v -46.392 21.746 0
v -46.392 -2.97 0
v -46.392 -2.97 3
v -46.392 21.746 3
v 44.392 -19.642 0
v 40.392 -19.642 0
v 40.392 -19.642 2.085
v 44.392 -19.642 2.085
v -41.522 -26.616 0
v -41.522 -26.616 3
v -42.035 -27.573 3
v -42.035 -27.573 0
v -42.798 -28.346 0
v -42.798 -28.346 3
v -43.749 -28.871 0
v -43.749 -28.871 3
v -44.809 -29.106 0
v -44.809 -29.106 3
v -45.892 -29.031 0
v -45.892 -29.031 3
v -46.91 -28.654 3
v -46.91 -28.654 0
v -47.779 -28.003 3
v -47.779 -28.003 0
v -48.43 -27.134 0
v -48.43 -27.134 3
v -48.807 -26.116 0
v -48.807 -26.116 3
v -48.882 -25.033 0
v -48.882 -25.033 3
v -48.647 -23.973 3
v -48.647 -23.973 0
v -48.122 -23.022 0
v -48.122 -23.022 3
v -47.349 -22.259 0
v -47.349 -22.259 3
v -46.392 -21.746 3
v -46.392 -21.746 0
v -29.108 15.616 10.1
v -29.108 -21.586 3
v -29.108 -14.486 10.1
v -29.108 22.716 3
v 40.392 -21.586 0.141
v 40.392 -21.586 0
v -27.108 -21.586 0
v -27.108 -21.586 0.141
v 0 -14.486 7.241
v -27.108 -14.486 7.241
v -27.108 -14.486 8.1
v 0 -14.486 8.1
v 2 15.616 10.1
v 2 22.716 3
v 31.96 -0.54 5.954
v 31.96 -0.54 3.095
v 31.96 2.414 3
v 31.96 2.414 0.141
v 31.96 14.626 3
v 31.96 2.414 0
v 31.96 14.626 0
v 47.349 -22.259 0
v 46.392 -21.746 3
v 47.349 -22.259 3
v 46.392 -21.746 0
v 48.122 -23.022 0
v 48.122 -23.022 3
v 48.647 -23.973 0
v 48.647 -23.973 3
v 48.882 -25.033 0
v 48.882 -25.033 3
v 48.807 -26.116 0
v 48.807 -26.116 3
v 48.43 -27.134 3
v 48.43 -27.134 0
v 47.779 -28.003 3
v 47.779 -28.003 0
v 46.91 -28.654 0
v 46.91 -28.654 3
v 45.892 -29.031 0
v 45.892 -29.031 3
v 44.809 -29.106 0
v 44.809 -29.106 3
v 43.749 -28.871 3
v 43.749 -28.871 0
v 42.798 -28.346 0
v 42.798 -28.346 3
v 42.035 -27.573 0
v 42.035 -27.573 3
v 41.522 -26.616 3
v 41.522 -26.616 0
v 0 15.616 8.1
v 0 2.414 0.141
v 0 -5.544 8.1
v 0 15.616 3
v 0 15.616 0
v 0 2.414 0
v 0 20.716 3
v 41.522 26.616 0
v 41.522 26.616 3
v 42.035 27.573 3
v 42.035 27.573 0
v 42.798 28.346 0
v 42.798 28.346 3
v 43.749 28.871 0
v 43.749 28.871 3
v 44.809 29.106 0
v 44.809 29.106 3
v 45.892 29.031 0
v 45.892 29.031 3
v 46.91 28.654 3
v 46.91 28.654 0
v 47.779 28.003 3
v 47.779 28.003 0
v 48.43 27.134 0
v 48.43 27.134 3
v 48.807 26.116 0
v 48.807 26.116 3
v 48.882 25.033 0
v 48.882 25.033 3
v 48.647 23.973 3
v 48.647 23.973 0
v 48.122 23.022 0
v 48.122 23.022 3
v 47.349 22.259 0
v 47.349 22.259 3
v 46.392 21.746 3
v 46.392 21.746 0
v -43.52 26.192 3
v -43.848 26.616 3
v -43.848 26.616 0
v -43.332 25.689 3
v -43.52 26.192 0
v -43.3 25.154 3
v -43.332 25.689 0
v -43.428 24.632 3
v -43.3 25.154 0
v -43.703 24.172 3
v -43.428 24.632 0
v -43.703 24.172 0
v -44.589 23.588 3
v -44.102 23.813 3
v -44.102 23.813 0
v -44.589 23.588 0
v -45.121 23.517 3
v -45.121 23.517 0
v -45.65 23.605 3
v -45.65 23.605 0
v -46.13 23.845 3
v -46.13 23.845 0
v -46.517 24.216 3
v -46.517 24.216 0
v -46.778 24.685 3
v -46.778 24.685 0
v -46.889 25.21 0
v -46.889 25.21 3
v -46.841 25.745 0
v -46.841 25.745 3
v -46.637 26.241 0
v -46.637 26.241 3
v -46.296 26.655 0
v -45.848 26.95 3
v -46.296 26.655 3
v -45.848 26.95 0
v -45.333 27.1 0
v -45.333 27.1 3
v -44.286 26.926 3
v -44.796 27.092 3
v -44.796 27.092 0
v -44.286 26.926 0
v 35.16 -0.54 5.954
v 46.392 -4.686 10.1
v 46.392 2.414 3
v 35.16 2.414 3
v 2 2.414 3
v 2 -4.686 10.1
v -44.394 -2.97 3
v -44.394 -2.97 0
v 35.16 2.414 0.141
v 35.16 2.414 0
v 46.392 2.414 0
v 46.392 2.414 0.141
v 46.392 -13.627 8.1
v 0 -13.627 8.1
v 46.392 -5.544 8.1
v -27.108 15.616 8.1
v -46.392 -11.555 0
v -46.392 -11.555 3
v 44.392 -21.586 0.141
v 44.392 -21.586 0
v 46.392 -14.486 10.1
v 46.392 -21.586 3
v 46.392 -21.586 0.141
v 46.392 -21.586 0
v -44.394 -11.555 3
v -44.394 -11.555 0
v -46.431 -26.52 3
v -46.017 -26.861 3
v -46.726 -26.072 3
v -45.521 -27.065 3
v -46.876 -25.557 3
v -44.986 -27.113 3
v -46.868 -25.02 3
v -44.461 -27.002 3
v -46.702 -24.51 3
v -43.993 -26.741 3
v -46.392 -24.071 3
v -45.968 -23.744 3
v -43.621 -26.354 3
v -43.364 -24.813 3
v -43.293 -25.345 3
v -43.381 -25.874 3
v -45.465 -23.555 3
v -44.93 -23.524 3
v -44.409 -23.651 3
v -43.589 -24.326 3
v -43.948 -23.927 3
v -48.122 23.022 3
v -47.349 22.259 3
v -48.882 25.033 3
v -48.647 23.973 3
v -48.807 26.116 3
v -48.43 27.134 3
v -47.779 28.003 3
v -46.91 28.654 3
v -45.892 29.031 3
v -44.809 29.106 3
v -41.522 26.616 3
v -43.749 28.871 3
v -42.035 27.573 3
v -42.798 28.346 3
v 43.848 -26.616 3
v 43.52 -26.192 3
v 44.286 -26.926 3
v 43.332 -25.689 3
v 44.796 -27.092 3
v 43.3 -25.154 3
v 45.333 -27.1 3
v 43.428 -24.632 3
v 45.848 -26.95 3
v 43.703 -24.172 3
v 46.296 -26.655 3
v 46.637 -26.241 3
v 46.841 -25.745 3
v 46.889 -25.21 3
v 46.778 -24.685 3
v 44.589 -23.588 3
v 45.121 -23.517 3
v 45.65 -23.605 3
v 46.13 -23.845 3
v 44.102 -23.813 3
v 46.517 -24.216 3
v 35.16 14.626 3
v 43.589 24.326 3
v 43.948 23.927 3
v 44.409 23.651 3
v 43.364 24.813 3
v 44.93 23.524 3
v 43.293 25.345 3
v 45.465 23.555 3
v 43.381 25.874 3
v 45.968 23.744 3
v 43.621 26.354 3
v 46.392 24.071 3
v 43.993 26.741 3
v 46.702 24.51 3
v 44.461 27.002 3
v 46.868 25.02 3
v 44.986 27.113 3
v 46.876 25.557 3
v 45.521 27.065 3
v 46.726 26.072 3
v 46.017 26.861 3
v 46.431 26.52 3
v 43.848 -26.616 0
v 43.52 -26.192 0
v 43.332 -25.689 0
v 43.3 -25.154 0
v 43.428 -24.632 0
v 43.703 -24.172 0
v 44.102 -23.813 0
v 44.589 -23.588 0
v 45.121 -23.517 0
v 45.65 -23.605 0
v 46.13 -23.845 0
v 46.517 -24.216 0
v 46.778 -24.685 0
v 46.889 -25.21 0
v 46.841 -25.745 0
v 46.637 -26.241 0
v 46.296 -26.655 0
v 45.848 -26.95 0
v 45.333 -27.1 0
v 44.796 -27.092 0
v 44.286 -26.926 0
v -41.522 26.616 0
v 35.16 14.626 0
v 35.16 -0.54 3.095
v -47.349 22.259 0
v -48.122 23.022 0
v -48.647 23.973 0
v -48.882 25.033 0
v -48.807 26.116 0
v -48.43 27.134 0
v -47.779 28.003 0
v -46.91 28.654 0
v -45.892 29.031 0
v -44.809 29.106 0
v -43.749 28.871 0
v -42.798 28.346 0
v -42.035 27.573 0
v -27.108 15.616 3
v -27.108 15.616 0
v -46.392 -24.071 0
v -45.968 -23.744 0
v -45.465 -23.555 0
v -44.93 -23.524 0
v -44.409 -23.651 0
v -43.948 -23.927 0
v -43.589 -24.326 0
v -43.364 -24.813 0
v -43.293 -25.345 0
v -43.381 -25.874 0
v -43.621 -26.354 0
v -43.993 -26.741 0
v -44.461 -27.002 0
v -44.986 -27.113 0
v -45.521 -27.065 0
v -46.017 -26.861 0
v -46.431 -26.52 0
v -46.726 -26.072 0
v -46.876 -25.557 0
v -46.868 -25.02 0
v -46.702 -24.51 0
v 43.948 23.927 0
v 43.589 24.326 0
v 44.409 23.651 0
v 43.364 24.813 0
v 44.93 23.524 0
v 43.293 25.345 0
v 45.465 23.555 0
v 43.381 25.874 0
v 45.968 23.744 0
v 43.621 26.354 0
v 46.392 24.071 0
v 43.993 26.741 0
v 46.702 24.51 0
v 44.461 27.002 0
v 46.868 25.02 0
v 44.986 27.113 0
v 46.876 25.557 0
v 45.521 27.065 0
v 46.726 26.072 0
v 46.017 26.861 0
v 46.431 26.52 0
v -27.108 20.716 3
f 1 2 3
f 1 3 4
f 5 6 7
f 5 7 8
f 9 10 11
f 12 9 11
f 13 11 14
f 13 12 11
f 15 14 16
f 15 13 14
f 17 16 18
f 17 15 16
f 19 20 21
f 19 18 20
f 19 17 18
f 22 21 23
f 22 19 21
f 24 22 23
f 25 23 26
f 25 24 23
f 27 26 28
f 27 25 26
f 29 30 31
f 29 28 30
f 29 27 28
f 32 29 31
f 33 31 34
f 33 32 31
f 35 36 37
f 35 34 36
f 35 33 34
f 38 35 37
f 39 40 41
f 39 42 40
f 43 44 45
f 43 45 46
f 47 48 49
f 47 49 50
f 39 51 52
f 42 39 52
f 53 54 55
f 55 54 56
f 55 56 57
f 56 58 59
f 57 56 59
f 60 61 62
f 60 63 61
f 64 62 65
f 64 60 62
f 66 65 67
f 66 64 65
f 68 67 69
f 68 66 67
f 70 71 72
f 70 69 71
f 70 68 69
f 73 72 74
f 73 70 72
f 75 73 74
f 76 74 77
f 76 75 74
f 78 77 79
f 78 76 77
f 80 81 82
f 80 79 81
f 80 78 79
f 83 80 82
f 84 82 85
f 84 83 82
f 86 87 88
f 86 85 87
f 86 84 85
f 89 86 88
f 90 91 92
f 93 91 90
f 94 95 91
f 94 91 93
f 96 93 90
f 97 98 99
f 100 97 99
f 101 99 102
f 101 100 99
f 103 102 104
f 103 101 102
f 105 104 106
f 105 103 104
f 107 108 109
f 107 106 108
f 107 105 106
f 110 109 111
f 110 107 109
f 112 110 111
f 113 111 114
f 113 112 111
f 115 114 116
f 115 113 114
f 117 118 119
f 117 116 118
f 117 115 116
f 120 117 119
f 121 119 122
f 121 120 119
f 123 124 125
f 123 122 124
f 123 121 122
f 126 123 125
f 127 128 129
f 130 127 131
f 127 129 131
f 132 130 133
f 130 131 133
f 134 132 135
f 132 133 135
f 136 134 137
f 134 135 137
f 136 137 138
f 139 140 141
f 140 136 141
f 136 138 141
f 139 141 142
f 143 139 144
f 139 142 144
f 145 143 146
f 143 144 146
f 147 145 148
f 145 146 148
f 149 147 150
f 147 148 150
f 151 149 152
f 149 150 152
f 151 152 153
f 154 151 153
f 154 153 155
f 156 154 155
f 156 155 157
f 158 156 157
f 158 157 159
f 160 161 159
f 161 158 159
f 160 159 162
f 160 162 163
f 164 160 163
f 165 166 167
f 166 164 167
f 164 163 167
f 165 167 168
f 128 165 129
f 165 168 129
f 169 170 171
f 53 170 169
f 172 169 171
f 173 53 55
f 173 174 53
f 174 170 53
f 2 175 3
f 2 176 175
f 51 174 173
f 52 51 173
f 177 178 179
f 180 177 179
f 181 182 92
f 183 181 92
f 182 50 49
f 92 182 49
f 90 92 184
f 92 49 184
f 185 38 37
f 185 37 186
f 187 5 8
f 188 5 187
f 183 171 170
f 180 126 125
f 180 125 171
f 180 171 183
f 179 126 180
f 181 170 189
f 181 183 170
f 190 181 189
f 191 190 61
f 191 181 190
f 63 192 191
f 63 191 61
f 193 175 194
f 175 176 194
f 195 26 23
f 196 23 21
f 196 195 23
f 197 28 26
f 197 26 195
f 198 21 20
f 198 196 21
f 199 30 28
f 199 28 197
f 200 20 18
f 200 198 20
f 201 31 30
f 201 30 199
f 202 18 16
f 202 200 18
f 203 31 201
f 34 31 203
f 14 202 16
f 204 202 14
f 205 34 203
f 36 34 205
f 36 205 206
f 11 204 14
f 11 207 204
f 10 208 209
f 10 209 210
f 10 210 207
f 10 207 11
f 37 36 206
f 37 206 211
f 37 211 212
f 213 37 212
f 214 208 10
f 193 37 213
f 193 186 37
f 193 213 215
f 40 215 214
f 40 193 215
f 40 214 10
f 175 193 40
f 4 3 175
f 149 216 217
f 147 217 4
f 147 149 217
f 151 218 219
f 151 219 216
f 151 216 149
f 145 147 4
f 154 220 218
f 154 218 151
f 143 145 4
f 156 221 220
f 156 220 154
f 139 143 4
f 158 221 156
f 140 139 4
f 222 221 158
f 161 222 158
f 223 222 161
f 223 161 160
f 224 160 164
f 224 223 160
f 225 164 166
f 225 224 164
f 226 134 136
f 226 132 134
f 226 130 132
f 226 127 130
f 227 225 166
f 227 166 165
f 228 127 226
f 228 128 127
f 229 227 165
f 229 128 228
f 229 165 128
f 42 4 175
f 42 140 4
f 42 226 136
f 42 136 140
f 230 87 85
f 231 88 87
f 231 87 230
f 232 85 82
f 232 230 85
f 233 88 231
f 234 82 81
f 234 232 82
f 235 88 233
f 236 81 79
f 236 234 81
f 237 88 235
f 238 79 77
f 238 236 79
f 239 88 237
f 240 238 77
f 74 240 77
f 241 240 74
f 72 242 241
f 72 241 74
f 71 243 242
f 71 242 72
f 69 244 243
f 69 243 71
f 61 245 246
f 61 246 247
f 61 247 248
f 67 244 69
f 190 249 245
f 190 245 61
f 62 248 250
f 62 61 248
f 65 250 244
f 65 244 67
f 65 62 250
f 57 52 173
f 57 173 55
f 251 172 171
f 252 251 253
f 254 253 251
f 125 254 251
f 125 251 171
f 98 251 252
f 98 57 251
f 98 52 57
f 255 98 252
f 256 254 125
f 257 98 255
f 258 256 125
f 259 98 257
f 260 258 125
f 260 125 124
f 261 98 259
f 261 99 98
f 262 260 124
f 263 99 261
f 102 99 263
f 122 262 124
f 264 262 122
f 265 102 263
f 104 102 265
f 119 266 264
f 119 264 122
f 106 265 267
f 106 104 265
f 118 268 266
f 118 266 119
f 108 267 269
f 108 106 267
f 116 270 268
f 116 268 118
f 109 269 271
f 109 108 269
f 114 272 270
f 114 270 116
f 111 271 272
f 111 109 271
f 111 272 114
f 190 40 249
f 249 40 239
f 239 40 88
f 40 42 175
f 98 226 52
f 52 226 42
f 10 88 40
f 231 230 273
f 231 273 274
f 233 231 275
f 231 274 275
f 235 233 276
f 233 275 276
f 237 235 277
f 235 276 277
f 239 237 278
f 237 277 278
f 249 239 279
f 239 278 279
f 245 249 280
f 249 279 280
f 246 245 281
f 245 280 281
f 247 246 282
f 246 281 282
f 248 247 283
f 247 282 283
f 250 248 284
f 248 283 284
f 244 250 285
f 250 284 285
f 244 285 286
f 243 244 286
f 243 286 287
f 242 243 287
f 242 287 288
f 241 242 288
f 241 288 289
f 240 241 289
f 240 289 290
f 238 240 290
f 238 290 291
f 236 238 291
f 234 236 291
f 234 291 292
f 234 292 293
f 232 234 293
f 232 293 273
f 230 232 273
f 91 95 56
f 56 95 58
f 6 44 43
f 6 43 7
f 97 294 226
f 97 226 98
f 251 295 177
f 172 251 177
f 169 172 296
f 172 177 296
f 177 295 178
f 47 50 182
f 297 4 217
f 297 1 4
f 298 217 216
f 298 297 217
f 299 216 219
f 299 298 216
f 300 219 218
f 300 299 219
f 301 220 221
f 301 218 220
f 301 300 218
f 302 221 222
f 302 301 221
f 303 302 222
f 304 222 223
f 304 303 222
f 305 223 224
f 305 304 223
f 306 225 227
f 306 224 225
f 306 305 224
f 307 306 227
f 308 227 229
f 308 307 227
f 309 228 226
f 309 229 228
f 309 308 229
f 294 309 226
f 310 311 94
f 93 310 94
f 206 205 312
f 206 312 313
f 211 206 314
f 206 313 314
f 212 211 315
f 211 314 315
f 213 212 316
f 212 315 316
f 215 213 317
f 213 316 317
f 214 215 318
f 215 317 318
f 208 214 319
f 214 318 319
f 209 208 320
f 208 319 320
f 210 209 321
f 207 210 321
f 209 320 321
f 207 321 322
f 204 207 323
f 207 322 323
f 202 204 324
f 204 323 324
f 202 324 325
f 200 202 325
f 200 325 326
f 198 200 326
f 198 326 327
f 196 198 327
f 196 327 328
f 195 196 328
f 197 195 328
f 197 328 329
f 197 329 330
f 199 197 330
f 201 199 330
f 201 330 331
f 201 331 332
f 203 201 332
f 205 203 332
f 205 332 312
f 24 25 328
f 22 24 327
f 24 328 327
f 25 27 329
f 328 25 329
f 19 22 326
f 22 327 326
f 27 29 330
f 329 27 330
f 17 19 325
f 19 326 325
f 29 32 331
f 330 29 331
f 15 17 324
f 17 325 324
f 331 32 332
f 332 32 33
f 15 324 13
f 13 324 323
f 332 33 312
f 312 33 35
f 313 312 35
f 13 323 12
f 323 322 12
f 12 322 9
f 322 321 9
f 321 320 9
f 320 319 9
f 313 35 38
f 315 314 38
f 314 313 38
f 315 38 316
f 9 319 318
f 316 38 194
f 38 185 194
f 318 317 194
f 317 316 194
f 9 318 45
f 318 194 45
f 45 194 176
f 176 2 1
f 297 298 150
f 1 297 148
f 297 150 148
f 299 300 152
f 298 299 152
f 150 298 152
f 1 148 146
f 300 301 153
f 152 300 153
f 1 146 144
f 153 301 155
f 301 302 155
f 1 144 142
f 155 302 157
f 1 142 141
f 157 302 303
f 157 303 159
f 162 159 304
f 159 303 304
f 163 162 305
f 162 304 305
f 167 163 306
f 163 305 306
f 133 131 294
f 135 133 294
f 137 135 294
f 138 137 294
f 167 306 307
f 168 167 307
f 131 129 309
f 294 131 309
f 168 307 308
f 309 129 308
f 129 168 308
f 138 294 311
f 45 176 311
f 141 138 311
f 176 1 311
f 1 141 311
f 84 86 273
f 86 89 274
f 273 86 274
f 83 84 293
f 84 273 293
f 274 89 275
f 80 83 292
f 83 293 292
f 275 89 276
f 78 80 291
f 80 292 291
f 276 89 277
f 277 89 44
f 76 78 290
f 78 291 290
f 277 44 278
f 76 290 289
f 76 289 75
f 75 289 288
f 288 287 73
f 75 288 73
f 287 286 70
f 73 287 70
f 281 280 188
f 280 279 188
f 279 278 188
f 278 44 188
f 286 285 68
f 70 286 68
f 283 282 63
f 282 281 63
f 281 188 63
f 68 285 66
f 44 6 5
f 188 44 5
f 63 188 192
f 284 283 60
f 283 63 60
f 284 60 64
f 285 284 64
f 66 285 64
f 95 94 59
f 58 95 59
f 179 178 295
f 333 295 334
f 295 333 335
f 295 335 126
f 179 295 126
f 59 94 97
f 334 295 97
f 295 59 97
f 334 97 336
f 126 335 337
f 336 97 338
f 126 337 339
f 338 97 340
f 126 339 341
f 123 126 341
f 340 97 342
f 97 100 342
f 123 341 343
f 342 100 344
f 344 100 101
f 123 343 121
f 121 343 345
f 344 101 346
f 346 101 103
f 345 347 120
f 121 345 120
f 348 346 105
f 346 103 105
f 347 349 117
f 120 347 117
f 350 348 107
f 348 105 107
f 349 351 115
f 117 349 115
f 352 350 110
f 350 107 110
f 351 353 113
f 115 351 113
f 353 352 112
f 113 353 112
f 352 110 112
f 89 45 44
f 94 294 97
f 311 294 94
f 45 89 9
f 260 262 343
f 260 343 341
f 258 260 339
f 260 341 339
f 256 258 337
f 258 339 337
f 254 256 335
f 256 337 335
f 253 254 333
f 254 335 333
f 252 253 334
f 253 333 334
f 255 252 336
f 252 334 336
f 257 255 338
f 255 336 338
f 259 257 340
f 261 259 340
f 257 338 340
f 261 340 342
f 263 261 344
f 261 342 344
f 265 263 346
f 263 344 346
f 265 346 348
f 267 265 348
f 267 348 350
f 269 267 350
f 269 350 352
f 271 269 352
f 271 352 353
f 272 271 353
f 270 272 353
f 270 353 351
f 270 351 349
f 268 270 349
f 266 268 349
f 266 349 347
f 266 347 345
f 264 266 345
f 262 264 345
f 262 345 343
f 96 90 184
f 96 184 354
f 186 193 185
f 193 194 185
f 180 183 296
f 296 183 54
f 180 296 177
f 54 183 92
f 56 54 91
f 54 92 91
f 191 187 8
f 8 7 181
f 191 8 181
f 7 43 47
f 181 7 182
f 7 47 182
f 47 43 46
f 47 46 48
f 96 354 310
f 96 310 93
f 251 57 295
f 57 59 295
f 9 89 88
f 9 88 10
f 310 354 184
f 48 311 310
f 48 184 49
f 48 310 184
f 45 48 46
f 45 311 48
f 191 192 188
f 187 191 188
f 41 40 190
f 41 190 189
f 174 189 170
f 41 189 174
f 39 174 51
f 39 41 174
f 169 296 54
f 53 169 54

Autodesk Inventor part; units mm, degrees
ref_plane "YZ Plane" through (0, 0, 0) normal (1, 0, 0) x (0, 1, 0)
ref_plane "XZ Plane" through (0, 0, 0) normal (0, 1, 0) x (-1, 0, 0)
ref_plane "XY Plane" through (0, 0, 0) normal (0, 0, 1) x (1, 0, 0)
sketch "Sketch1" plane through (0, 0, 0) normal (0, 0, 1) x (1, 0, 0)
  arc A0 (-46.3925, 24.0714) -> (-43.8475, 26.6164) centre (-45.0925, 25.3164) ccw
  line L0 (-46.3925, 9.0304) -> (-46.3925, 24.0714)
  line L1 (-46.3925, 9.0304) -> (-44.3931, 9.0304)
  line L2 (-44.3925, 21.1036) -> (-44.3931, 9.0304)
  arc A1 (-44.3925, 21.1036) -> (-40.8797, 24.6164) centre (-43.8925, 24.1164) ccw
  line L3 (40.9925, 24.6164) -> (-40.8797, 24.6164)
  line L4 (40.9925, 16.6164) -> (40.9925, 24.6164)
  line L5 (44.3925, 16.6164) -> (40.9925, 16.6164)
  line L6 (44.3925, 2.4144) -> (44.3925, 16.6164)
  line L7 (44.3925, 2.4144) -> (46.3925, 2.4144)
  line L8 (46.3925, 24.0714) -> (46.3925, 2.4144)
  arc A2 (43.8475, 26.6164) -> (46.3925, 24.0714) centre (45.0925, 25.3164) ccw
  line L9 (-43.8475, 26.6164) -> (43.8475, 26.6164)
  arc A3 (-43.8475, -26.6164) -> (-46.3925, -24.0714) centre (-45.0925, -25.3164) ccw
  line L10 (43.8475, -26.6164) -> (-43.8475, -26.6164)
  arc A4 (46.3925, -24.0714) -> (43.8475, -26.6164) centre (45.0925, -25.3164) ccw
  line L11 (46.3925, -21.5856) -> (46.3925, -24.0714)
  line L12 (46.3925, -21.5856) -> (44.3925, -21.5856)
  line L13 (44.3925, -19.6418) -> (44.3925, -21.5856)
  line L14 (40.3925, -19.6418) -> (44.3925, -19.6418)
  line L15 (40.3925, -24.6418) -> (40.3925, -19.6418)
  line L16 (-40.8818, -24.6418) -> (40.3925, -24.6418)
  arc A5 (-40.8818, -24.6418) -> (-42.6446, -21.3551) centre (-43.8945, -24.1416) ccw
  line L17 (-46.3925, -21.3551) -> (-42.6446, -21.3551)
  line L18 (-46.3925, -24.0714) -> (-46.3925, -21.3551)
  line L19 (-46.3925, -21.7457) -> (-46.3925, -24.0714)
  arc A6 (-46.3925, -21.7457) -> (-41.5218, -26.6164) centre (-45.0925, -25.3164) ccw
  line L20 (-43.8475, -26.6164) -> (-41.5218, -26.6164)
  arc A7 (-46.3925, -24.0714) -> (-43.8475, -26.6164) centre (-45.0925, -25.3164) ccw
  line L21 (41.5218, -26.6164) -> (43.8475, -26.6164)
  arc A8 (41.5218, -26.6164) -> (46.3925, -21.7457) centre (45.0925, -25.3164) ccw
  line L22 (46.3925, -24.0714) -> (46.3925, -21.7457)
  arc A9 (43.8475, -26.6164) -> (46.3925, -24.0714) centre (45.0925, -25.3164) ccw
  line L23 (46.3925, 21.7457) -> (46.3925, 24.0714)
  arc A10 (46.3925, 21.7457) -> (41.5218, 26.6164) centre (45.0925, 25.3164) ccw
  line L24 (43.8475, 26.6164) -> (41.5218, 26.6164)
  arc A11 (46.3925, 24.0714) -> (43.8475, 26.6164) centre (45.0925, 25.3164) ccw
  line L25 (-41.5218, 26.6164) -> (-43.8475, 26.6164)
  arc A12 (-41.5218, 26.6164) -> (-46.3925, 21.7457) centre (-45.0925, 25.3164) ccw
  line L26 (-46.3925, 24.0714) -> (-46.3925, 21.7457)
  arc A13 (-43.8475, 26.6164) -> (-46.3925, 24.0714) centre (-45.0925, 25.3164) ccw
  line L27 (44.3925, 2.4144) -> (0, 2.4144)
  line L28 (0, 2.4144) -> (0, 24.6164)
  line L29 (44.3925, -21.5856) -> (0, -21.5856)
  line L30 (-44.3937, -2.9696) -> (-46.3925, -2.9696)
  line L31 (-46.3925, -11.5551) -> (-46.3925, -2.9696)
  line L32 (-44.3941, -11.5551) -> (-46.3925, -11.5551)
  line L33 (-44.3937, -2.9696) -> (-44.3941, -11.5551)
  line L34 (-46.3925, -21.7457) -> (-46.3925, -11.5551)
  line L35 (-46.3925, -2.9696) -> (-46.3925, 9.0304)
  line L36 (0, -11.3836) -> (-27, -11.3836)
  line L37 (-27, -11.3836) -> (-27, 15.6164)
  line L38 (-27, 15.6164) -> (0, 15.6164)
  line L39 (0, 15.6164) -> (0, -11.3836)
  line L40 (0, -11.3836) -> (0, -21.5856)
  point P0 (0, 0)
  point P1 (40.3925, -21.5856)
  point P2 (0, 15.6164)
extrude "Extrusion1" add sketch "Sketch1" along normal blind 3 contours A0 L9 A2 L8 L7 L6 L5 L4 L3 A1 L2 L1 L0 | L0 A12 L9 A13 | L1 L2 A1 L3 L28 L38 L37 L36 L40 L29 L15 L16 A5 L17 L34 L32 L33 L30 L35 | A10 L8 A11 L9 | L17 A5 L16 L15 L29 L12 L11 A4 L10 A3 L18 | L27 L28 L3 L4 L5 L6 | L18 A7 L10 A6 | L10 A9 L11 A8 | L15 L14 L13 L29
sketch "Sketch2" plane through (44.3925, -21.5856, 0) normal (1, 0, 0) x (0, 0, -1)
  line L0 (0, 0) -> (-8, 8) projected
  line L1 (-8, 16) -> (0, 24) projected
  line L2 (-8, 8) -> (-8, 16) projected
  line L3 (-0.0707, -0.0707) -> (-8.1, 7.9586)
  line L4 (-8.1, 7.9586) -> (-8.1, 16.0414)
  line L5 (-8.1, 16.0414) -> (-0.0707, 24.0707)
  line L6 (0, 0) -> (-3, 0) projected
  line L7 (0, 24) -> (-3, 24) projected
  line L8 (-3, 0) -> (-10.1, 7.1)
  line L9 (-10.1, 7.1) -> (-10.1, 16.9)
  line L10 (-10.1, 16.9) -> (-3, 24)
  point P0 (0, 21.5856)
  point P1 (-0.1414, 24)
  point P2 (-0.1414, 0)
  dimension "d5" = 0.1
  dimension "d6" = 2
extrude "Extrusion2" add sketch "Sketch2" along normal blind 2 and the other way blind 71.5 contours L6 L8 L9 L10 L7 L5 L4 L3
sketch "Sketch3" plane through (0, 0, 3) normal (0, 0, 1) x (1, 0, 0)
  line L0 (0, 15.6164) -> (0, 2.4144) projected
  line L1 (-27.1075, -21.5856) -> (-27.1075, -14.4856) projected
  line L2 (0, 15.6164) -> (-27.1075, 15.6164)
  line L3 (-27.1075, 15.6164) -> (-27.1075, -14.4856)
  line L4 (-27.1075, -14.4856) -> (0, -14.4856)
  line L5 (0, -14.4856) -> (0, 15.6164)
  point P0 (0, 0)
  point P1 (0, 2.4144)
extrude "Extrusion3" cut sketch "Sketch3" along normal blind 10 and the other way blind 3.25
sketch "Sketch4" plane through (0, 2.4144, 0) normal (-1, 0, 0) x (0, 0, 1)
  line L0 (10.1, -16.9) -> (7.2414, -16.9) projected
  line L1 (8.1, -16.0414) -> (8.1, -7.9586) projected
  line L2 (8.1, -15.8474) -> (8.1, -16.9)
  line L3 (8.1, -16.9) -> (10.1, -16.9)
  line L4 (10.1, -16.9) -> (10.1, 13.202)
  line L5 (10.1, 13.202) -> (8.1, 13.202)
  line L6 (8.1, 13.202) -> (8.1, -16.9)
  line L7 (10.1, 13.202) -> (2.1168, 21.1852)
  line L8 (10.1, 13.202) -> (21.3899, 13.202) construction
  line L9 (3, 13.202) -> (3, 0) projected
  line L10 (3, 0) -> (3, 19.3313) projected
  line L11 (3, 19.3313) -> (3, 24.202) projected
  line L12 (3, 24.202) -> (3, 19.3313) projected
  line L13 (3, 19.3313) -> (3, -5.384) projected
  line L14 (3, -5.384) -> (3, -13.9695) projected
  line L15 (3, -13.9695) -> (3, -24.1601) projected
  line L16 (3, -24.1601) -> (3, -29.0308) projected
  line L17 (3, -29.0308) -> (3, -24.1601) projected
  line L18 (3, -24.1601) -> (3, -24) projected
  line L19 (3, -24) -> (3, -21.1414) projected
  line L20 (3, -21.1414) -> (3, -16.9) projected
  line L21 (3, -16.9) -> (3, 13.202) projected
  line L22 (3, 24.702) -> (3, 21.102) projected
  line L23 (3, -25.9308) -> (3, -29.5308) projected
  line L24 (3, -25.9308) -> (3, -29.5308) projected
  line L25 (3, 24.702) -> (3, 21.102) projected
  line L26 (8.1, 13.202) -> (3, 18.302)
  point P0 (0, -2.4144)
  point P1 (10.1, -7.1)
  point P2 (8.1, -7.9586)
  point P3 (3, 20.302)
  point P4 (3, 18.302)
  dimension "d15" = 135
extrude "Extrusion4" add sketch "Sketch4" along normal up to surface (27.1075 mm away)
sketch "Sketch5" plane through (0, 2.4144, 0) normal (1, 0, 0) x (0, 0, -1)
  line L0 (-10.1, -7.1) -> (-10.1, 13.202) projected
  line L1 (-8.1, -5.1) -> (-10.1, -7.1) projected
  line L2 (-8.1, 13.202) -> (-8.1, -5.1) projected
  line L3 (-3, 18.302) -> (-8.1, 13.202) projected
  line L4 (-3, 20.302) -> (-3, 18.302) projected
  line L5 (-10.1, 13.202) -> (-3, 20.302) projected
  line L6 (-10.1, -7.1) -> (-10.1, 13.202) projected
  line L7 (-3, 18.302) -> (-3, 0)
  line L8 (-3, 0) -> (-8.1, -5.1)
  point P0 (0, -2.4144)
  point P1 (-10.1, 13.202)
extrude "Extrusion5" add sketch "Sketch5" along normal blind 2
sketch "Sketch6" plane through (-27.1075, -21.5856, 0) normal (-1, 0, 0) x (0, 0, 1)
  line L0 (8.1, 7.1) -> (7.2414, 7.1) projected
  line L1 (7.2414, 7.1) -> (3, 2.8586) projected
  line L2 (3, 0) -> (3, 2.8586) projected
  line L3 (3, 0) -> (10.1, 7.1) projected
  line L4 (10.1, 37.202) -> (10.1, 7.1) projected
  line L5 (3, 44.302) -> (10.1, 37.202) projected
  line L6 (3, 42.302) -> (3, 44.302) projected
  line L7 (8.1, 37.202) -> (3, 42.302) projected
  line L8 (8.1, 7.1) -> (8.1, 37.202) projected
  line L9 (3, 0) -> (14.0396, 0)
  line L10 (14.0396, 0) -> (14.0396, 45.0941)
  line L11 (14.0396, 45.0941) -> (3, 45.0941)
  line L12 (3, 45.0941) -> (3, 0)
  point P0 (0, 21.5856)
  point P1 (3, 2.8586)
extrude "Extrusion6" add sketch "Sketch6" along normal blind 2 contours L8 L7 L6 L5 L4 L3 L2 L1 L0 | L0 L1 L12 L7 L8
sketch "Sketch7" plane through (0, -21.5856, 0) normal (1, 0, 0) x (0, 0, -1)
  line L0 (0, 7.1) -> (-3, 7.1) projected
  line L1 (-3, 2.8586) -> (-3, 7.1) projected
  line L2 (-3, 2.8586) -> (-0.1414, 0) projected
  line L3 (0, 0) -> (-0.1414, 0) projected
  line L4 (0, 0) -> (0, 7.1) projected
  point P0 (0, 21.5856)
extrude "Extrusion7" cut sketch "Sketch7" against normal up to surface (27.1075 mm away)
sketch "Sketch8" plane through (0, 0, 3) normal (0, 0, 1) x (1, 0, 0)
  line L0 (35.1595, -0.5396) -> (31.9595, -0.5396)
  line L1 (31.9595, -0.5396) -> (31.9595, 14.6261)
  line L2 (31.9595, 14.6261) -> (35.1595, 14.6261)
  line L3 (35.1595, 14.6261) -> (35.1595, -0.5396)
  line L4 (34.1345, -0.0368) -> (34.1345, -0.9368) projected
  line L5 (32.9845, -0.0368) -> (32.9845, -0.9368) projected
  line L6 (32.9845, -0.7101) -> (34.1345, -0.7101)
  line L7 (33.5595, -0.7101) -> (33.5595, 14.6138)
  point P0 (0, 0)
  dimension "d24" = 3.2
  dimension "d25" = 1.6
extrude "Extrusion8" cut sketch "Sketch8" along normal blind 10 and the other way blind 5 contours L0 L1 L2 L3
sketch "Sketch9" plane through (-46.3925, -2.9696, 0) normal (-1, 0, 0) x (0, 0, 1)
  line L0 (-6.415, 12) -> (0, 12) projected
  line L1 (3, 0) -> (-6.415, 0) projected
  line L2 (-6.415, 11.8) -> (0, 11.8)
  line L3 (3, 0.2) -> (-6.415, 0.2)
  line L4 (0, 5.384) -> (0, 24.7153) projected
  arc A0 (0, 9.8) -> (-2, 11.8) centre (-2, 9.8) ccw
  line L5 (0, 24.7153) -> (0, 0) projected
  arc A1 (-1.8751, 0.2) -> (0, 2.0751) centre (-1.8751, 2.0751) ccw
  point P0 (0, 2.9696)
  dimension "d30" = 0.2
  dimension "d31" = 0.2
  dimension "d32" = 2
properties part number "Top_case"
